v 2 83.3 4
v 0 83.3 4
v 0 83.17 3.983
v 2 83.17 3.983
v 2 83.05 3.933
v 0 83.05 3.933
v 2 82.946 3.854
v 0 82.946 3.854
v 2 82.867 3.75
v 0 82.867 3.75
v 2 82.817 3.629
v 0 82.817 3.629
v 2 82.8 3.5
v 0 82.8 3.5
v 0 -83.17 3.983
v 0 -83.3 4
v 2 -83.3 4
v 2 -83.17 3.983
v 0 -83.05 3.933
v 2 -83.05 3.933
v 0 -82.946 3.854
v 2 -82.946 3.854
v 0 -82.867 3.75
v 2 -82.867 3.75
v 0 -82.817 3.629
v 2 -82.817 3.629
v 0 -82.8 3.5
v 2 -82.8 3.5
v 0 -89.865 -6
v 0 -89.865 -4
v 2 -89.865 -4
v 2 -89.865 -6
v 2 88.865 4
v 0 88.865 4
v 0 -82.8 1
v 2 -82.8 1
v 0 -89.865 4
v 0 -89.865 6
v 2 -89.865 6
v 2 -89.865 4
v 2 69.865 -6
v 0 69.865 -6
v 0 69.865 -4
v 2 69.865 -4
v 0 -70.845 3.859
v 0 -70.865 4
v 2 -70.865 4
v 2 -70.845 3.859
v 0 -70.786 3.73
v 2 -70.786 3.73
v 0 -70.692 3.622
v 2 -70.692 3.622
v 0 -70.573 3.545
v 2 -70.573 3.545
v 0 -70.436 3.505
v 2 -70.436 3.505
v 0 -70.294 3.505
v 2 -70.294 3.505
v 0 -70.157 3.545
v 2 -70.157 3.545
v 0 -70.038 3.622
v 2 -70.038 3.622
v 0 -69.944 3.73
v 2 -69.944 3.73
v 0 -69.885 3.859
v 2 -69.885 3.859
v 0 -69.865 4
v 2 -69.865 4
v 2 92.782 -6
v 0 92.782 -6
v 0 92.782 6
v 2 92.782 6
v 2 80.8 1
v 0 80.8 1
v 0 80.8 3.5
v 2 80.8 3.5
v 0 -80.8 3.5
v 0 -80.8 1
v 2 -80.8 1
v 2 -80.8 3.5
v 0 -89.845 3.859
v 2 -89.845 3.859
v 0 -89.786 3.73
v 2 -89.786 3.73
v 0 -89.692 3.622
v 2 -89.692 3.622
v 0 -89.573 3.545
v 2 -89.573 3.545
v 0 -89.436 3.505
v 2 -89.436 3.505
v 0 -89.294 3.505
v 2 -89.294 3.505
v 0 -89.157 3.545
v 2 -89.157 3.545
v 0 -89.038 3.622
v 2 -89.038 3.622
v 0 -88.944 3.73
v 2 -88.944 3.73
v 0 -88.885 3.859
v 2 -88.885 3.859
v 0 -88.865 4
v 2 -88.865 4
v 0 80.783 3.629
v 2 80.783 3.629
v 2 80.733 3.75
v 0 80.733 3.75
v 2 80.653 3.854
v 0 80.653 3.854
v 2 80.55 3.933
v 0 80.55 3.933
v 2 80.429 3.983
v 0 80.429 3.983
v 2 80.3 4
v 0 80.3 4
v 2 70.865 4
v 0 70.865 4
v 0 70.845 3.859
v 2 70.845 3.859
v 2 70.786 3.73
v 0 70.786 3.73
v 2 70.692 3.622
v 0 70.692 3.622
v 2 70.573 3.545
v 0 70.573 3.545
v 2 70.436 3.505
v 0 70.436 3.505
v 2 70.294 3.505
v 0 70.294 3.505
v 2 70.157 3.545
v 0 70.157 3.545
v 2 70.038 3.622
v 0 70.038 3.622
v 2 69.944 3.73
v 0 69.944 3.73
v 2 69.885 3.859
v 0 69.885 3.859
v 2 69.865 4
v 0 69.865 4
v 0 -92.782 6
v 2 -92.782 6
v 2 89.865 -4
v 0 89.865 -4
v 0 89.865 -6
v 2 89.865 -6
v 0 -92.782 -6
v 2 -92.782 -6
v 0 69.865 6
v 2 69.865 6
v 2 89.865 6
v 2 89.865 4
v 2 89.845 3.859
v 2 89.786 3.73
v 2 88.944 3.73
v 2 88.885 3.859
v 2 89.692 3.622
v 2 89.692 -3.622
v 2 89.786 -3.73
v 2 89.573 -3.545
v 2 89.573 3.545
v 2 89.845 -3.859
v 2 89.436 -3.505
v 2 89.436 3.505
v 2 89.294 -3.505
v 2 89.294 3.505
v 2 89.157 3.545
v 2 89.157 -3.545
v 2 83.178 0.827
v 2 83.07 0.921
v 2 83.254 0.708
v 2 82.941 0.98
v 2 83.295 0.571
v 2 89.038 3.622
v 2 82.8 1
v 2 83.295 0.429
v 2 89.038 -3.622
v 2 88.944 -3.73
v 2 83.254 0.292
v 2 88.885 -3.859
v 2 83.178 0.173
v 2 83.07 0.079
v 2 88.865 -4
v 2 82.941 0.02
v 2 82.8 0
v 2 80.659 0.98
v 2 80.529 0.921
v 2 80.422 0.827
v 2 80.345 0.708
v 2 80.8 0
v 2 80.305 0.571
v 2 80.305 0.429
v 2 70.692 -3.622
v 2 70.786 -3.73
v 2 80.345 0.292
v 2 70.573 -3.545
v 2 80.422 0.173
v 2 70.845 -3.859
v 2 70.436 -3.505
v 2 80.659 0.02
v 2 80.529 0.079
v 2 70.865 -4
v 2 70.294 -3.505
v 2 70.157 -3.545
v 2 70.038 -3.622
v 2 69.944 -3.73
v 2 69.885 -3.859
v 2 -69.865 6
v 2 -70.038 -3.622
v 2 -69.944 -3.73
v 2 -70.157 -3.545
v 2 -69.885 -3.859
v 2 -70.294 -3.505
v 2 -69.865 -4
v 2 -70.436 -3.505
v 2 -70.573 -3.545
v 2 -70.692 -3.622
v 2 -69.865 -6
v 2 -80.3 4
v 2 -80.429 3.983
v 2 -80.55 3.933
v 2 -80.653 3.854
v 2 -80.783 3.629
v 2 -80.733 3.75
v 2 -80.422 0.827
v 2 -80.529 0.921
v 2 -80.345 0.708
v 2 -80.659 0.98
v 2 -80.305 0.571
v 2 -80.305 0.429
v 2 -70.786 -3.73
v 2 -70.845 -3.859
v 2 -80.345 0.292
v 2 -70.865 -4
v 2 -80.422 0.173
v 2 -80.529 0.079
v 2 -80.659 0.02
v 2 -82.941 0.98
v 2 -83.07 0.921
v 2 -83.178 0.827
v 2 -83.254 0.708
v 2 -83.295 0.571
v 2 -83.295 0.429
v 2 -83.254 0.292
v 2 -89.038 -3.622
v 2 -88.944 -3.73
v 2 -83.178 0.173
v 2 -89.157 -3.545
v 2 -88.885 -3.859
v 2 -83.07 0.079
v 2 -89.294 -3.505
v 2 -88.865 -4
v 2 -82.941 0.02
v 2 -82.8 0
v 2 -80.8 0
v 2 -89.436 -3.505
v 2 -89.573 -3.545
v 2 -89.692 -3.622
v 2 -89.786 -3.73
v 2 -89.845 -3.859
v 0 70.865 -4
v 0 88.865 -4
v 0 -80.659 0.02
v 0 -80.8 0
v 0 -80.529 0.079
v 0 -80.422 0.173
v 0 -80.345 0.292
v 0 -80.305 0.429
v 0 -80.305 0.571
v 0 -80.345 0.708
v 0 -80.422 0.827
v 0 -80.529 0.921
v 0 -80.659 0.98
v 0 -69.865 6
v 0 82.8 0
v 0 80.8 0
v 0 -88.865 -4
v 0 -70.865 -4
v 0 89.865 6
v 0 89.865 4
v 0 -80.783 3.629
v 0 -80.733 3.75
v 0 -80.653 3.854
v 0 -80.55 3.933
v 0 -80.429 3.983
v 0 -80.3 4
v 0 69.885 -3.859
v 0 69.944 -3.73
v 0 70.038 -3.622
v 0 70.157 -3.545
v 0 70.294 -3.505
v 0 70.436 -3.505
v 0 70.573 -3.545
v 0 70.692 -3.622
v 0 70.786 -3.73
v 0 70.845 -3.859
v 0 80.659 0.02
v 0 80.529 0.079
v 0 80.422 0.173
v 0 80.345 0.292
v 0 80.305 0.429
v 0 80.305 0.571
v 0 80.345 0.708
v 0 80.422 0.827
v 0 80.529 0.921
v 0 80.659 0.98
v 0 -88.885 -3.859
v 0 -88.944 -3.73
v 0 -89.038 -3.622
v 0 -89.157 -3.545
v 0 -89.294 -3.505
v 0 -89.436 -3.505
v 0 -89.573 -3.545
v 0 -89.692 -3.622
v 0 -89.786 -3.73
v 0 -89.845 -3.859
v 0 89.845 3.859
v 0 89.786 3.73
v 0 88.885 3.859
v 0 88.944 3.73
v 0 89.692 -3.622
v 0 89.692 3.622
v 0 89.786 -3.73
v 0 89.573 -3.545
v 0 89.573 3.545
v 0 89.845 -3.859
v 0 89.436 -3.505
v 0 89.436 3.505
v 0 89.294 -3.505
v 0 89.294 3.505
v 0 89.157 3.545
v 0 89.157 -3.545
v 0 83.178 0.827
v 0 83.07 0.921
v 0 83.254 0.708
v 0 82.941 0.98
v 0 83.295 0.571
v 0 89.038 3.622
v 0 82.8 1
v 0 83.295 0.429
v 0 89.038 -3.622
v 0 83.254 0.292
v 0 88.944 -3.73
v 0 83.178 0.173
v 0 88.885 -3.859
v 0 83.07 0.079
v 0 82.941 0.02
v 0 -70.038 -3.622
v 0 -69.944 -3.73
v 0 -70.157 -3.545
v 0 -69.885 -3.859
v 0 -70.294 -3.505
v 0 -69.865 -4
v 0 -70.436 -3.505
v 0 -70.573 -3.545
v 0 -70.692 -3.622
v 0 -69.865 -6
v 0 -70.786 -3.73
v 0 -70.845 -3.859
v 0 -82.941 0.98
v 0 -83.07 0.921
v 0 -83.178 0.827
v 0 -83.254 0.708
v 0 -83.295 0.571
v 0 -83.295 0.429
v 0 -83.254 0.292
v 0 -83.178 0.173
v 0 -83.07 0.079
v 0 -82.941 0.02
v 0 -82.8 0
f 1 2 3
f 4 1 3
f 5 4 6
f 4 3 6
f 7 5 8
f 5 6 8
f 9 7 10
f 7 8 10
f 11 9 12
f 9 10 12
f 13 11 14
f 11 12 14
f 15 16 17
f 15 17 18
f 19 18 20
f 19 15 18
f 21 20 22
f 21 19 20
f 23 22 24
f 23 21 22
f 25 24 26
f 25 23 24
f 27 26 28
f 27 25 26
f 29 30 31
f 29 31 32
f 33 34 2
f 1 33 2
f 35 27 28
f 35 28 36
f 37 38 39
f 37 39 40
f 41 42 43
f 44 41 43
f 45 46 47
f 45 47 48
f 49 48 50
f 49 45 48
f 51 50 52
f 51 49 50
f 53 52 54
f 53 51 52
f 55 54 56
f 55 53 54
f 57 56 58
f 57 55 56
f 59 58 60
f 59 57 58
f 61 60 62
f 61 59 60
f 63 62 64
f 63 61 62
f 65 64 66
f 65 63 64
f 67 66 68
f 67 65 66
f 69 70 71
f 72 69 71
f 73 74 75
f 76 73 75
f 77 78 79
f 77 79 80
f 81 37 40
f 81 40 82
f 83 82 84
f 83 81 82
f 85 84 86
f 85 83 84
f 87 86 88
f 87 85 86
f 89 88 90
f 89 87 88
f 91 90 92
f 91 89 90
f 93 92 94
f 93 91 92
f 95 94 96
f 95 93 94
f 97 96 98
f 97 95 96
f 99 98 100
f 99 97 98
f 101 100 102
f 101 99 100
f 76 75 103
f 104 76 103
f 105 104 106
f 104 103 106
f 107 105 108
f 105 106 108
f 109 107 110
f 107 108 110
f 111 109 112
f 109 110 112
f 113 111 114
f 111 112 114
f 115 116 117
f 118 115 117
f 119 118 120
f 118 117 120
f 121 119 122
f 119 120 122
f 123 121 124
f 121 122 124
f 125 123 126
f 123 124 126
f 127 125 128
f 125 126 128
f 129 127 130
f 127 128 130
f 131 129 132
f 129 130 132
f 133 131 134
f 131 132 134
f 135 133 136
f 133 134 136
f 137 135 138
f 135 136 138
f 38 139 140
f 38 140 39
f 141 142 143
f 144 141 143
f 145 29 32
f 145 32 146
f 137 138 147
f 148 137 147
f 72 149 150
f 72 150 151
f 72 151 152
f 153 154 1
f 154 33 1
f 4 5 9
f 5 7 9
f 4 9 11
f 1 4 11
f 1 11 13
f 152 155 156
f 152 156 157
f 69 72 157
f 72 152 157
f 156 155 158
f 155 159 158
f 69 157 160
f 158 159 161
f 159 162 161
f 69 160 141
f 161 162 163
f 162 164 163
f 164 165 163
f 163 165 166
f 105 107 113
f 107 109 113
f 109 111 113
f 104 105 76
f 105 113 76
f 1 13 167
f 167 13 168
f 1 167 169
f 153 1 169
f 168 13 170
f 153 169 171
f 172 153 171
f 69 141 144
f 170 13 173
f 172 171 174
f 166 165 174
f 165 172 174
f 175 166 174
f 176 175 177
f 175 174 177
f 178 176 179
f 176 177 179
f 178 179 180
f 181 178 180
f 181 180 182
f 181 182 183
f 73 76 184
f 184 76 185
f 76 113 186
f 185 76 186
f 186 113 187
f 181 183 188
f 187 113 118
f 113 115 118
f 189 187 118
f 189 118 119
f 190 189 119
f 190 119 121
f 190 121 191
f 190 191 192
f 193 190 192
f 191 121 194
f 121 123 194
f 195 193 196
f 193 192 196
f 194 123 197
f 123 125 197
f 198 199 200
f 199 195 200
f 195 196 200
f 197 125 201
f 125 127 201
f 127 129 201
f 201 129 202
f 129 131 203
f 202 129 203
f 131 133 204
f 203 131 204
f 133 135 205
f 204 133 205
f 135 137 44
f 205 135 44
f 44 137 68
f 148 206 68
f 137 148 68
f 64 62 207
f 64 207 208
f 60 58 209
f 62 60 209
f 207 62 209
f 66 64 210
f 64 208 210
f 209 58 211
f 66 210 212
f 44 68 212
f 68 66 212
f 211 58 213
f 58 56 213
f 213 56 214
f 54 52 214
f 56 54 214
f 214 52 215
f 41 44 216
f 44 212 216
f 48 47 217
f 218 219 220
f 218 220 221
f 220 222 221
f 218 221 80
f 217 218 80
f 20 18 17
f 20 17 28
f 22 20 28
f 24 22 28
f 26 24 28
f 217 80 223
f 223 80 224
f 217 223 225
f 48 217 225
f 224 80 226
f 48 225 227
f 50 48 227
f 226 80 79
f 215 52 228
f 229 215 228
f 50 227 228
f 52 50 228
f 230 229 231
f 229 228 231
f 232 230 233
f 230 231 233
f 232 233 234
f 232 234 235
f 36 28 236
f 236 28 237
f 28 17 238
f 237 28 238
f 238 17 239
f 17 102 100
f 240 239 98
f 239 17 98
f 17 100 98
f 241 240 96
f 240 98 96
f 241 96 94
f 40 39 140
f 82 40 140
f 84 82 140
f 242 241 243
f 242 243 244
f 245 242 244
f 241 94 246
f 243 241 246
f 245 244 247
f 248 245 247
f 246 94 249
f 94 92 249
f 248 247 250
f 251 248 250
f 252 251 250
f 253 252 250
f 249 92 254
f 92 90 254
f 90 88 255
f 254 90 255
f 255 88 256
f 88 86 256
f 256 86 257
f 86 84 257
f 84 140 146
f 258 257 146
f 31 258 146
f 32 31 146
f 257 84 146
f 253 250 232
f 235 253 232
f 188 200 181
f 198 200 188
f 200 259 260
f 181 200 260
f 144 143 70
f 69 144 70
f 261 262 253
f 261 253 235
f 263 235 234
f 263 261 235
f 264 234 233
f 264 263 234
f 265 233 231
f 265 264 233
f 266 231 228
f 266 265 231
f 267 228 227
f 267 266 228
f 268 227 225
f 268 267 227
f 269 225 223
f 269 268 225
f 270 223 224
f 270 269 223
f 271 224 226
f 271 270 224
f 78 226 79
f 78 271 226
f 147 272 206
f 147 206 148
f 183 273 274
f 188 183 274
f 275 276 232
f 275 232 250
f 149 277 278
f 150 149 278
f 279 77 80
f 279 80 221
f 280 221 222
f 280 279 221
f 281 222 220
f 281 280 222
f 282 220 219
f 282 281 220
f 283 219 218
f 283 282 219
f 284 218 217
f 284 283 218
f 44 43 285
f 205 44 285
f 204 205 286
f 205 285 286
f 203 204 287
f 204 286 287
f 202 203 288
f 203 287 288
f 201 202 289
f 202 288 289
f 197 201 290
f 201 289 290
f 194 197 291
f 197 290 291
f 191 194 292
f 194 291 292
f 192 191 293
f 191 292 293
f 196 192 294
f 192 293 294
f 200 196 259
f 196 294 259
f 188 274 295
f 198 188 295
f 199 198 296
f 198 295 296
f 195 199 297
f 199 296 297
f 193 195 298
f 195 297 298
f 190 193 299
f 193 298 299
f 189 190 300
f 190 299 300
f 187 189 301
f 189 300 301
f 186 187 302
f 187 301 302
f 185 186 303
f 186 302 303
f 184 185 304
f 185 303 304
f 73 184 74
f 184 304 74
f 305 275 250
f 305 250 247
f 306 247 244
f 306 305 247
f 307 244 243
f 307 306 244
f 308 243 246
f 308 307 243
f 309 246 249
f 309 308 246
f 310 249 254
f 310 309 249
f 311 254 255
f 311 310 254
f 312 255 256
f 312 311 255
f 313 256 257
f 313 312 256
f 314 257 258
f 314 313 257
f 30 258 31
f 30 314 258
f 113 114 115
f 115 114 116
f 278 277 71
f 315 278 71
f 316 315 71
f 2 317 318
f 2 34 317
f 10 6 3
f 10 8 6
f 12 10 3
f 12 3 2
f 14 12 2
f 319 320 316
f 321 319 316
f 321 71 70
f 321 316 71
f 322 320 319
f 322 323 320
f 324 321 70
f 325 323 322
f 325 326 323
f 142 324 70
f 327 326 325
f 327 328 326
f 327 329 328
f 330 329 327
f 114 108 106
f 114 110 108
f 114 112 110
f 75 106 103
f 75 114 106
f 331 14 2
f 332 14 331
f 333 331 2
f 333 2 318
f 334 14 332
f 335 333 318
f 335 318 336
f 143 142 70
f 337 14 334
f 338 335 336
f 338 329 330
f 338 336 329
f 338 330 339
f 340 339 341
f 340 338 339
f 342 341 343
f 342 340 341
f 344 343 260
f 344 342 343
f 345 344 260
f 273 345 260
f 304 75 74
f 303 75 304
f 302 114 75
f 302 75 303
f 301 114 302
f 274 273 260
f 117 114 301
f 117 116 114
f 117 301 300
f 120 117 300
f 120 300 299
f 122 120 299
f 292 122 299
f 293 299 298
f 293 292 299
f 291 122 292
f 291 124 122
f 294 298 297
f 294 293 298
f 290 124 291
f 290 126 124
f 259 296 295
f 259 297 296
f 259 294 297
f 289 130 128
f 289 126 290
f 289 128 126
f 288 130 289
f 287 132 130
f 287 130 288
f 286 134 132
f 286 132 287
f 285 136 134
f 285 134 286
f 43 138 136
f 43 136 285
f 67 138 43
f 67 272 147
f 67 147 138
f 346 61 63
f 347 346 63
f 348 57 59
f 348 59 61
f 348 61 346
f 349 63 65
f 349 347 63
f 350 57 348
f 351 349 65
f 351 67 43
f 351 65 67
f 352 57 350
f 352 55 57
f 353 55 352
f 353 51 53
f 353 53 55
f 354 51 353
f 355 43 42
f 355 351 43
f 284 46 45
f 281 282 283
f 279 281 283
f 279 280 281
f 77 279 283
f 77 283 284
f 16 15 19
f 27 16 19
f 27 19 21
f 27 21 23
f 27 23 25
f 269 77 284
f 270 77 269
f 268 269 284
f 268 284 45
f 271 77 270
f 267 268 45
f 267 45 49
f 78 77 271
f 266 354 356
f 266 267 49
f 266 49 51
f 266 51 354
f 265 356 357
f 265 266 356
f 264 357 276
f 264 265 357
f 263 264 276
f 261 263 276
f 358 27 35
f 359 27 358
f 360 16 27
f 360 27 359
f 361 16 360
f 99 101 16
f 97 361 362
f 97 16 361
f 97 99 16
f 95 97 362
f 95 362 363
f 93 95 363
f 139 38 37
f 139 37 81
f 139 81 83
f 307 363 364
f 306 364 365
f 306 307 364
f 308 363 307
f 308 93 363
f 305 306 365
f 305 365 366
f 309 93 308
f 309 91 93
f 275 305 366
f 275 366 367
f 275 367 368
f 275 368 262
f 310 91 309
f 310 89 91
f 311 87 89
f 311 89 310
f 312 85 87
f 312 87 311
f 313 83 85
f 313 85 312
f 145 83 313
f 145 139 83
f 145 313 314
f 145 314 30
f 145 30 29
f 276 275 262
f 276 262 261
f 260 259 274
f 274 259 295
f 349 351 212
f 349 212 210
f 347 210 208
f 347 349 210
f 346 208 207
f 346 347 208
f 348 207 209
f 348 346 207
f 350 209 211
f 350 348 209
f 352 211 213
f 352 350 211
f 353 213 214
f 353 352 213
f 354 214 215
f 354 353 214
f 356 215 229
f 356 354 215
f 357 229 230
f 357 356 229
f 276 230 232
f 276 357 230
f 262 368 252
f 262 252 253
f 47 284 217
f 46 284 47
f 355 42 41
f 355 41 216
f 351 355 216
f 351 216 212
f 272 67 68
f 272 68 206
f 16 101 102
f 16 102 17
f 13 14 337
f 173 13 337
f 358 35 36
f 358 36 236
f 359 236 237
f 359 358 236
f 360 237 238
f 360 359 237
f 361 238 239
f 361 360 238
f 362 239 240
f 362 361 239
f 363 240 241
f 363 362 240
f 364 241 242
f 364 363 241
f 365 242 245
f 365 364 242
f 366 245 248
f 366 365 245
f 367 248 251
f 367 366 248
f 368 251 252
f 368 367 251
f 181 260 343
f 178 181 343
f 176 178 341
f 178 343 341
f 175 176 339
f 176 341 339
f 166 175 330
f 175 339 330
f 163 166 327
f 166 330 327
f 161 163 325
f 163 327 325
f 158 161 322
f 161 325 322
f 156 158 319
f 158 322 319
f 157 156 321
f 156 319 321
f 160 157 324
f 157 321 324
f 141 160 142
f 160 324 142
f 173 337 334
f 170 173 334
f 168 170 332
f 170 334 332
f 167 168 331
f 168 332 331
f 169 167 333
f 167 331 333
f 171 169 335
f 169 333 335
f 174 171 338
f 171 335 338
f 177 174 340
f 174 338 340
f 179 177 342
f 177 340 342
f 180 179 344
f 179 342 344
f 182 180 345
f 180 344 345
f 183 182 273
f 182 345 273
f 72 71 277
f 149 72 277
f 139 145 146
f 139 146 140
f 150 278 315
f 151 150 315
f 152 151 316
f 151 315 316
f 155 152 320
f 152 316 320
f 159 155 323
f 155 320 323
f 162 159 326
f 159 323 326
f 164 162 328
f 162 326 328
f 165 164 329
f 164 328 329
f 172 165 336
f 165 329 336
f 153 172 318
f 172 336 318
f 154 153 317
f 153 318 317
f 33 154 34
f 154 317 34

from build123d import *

# Parameters (mm, degrees)
BOSS_EXTRUDE1_DEPTH = 2


with BuildPart() as part:
    # Sketch2 → Boss-Extrude1 (new body)
    with BuildSketch(Plane(origin=(0, 0, 0), x_dir=(0, 0, -1), z_dir=(1, 0, 0))):
        with BuildLine():
            Line((-6, 0), (6, 0))
            Line((6, 0), (6, 69.865))
            Line((6, 69.865), (4, 69.865))
            ThreePointArc((4, 69.865), (3.5, 70.365), (4, 70.865))
            Line((4, 70.865), (4, 88.865))
            ThreePointArc((4, 88.865), (3.5, 89.365), (4, 89.865))
            Line((4, 89.865), (6, 89.865))
            Line((6, 89.865), (6, 92.781745931))
            Line((6, 92.781745931), (-6, 92.781745931))
            Line((-6, 92.781745931), (-6, 89.865))
            Line((-6, 89.865), (-4, 89.865))
            ThreePointArc((-4, 89.865), (-3.5, 89.365), (-4, 88.865))
            Line((-4, 88.865), (-4, 83.299671709))
            ThreePointArc((-4, 83.299671709), (-3.853553391, 82.946118318), (-3.5, 82.799671709))
            Line((-3.5, 82.799671709), (-1, 82.799671709))
            ThreePointArc((-1, 82.799671709), (-0.5, 83.299671709), (0, 82.799671709))
            Line((0, 82.799671709), (0, 80.799671709))
            ThreePointArc((0, 80.799671709), (-0.5, 80.299671709), (-1, 80.799671709))
            Line((-1, 80.799671709), (-3.5, 80.799671709))
            ThreePointArc((-3.5, 80.799671709), (-3.853553391, 80.653225099), (-4, 80.299671709))
            Line((-4, 80.299671709), (-4, 70.865))
            ThreePointArc((-4, 70.865), (-3.5, 70.365), (-4, 69.865))
            Line((-4, 69.865), (-6, 69.865))
            Line((-6, 69.865), (-6, 0))
        make_face()
    boss_extrude1 = extrude(amount=BOSS_EXTRUDE1_DEPTH)

    # Mirror1: Boss-Extrude1 across plane
    add(boss_extrude1.mirror(Plane.ZX))


solid = part.part
